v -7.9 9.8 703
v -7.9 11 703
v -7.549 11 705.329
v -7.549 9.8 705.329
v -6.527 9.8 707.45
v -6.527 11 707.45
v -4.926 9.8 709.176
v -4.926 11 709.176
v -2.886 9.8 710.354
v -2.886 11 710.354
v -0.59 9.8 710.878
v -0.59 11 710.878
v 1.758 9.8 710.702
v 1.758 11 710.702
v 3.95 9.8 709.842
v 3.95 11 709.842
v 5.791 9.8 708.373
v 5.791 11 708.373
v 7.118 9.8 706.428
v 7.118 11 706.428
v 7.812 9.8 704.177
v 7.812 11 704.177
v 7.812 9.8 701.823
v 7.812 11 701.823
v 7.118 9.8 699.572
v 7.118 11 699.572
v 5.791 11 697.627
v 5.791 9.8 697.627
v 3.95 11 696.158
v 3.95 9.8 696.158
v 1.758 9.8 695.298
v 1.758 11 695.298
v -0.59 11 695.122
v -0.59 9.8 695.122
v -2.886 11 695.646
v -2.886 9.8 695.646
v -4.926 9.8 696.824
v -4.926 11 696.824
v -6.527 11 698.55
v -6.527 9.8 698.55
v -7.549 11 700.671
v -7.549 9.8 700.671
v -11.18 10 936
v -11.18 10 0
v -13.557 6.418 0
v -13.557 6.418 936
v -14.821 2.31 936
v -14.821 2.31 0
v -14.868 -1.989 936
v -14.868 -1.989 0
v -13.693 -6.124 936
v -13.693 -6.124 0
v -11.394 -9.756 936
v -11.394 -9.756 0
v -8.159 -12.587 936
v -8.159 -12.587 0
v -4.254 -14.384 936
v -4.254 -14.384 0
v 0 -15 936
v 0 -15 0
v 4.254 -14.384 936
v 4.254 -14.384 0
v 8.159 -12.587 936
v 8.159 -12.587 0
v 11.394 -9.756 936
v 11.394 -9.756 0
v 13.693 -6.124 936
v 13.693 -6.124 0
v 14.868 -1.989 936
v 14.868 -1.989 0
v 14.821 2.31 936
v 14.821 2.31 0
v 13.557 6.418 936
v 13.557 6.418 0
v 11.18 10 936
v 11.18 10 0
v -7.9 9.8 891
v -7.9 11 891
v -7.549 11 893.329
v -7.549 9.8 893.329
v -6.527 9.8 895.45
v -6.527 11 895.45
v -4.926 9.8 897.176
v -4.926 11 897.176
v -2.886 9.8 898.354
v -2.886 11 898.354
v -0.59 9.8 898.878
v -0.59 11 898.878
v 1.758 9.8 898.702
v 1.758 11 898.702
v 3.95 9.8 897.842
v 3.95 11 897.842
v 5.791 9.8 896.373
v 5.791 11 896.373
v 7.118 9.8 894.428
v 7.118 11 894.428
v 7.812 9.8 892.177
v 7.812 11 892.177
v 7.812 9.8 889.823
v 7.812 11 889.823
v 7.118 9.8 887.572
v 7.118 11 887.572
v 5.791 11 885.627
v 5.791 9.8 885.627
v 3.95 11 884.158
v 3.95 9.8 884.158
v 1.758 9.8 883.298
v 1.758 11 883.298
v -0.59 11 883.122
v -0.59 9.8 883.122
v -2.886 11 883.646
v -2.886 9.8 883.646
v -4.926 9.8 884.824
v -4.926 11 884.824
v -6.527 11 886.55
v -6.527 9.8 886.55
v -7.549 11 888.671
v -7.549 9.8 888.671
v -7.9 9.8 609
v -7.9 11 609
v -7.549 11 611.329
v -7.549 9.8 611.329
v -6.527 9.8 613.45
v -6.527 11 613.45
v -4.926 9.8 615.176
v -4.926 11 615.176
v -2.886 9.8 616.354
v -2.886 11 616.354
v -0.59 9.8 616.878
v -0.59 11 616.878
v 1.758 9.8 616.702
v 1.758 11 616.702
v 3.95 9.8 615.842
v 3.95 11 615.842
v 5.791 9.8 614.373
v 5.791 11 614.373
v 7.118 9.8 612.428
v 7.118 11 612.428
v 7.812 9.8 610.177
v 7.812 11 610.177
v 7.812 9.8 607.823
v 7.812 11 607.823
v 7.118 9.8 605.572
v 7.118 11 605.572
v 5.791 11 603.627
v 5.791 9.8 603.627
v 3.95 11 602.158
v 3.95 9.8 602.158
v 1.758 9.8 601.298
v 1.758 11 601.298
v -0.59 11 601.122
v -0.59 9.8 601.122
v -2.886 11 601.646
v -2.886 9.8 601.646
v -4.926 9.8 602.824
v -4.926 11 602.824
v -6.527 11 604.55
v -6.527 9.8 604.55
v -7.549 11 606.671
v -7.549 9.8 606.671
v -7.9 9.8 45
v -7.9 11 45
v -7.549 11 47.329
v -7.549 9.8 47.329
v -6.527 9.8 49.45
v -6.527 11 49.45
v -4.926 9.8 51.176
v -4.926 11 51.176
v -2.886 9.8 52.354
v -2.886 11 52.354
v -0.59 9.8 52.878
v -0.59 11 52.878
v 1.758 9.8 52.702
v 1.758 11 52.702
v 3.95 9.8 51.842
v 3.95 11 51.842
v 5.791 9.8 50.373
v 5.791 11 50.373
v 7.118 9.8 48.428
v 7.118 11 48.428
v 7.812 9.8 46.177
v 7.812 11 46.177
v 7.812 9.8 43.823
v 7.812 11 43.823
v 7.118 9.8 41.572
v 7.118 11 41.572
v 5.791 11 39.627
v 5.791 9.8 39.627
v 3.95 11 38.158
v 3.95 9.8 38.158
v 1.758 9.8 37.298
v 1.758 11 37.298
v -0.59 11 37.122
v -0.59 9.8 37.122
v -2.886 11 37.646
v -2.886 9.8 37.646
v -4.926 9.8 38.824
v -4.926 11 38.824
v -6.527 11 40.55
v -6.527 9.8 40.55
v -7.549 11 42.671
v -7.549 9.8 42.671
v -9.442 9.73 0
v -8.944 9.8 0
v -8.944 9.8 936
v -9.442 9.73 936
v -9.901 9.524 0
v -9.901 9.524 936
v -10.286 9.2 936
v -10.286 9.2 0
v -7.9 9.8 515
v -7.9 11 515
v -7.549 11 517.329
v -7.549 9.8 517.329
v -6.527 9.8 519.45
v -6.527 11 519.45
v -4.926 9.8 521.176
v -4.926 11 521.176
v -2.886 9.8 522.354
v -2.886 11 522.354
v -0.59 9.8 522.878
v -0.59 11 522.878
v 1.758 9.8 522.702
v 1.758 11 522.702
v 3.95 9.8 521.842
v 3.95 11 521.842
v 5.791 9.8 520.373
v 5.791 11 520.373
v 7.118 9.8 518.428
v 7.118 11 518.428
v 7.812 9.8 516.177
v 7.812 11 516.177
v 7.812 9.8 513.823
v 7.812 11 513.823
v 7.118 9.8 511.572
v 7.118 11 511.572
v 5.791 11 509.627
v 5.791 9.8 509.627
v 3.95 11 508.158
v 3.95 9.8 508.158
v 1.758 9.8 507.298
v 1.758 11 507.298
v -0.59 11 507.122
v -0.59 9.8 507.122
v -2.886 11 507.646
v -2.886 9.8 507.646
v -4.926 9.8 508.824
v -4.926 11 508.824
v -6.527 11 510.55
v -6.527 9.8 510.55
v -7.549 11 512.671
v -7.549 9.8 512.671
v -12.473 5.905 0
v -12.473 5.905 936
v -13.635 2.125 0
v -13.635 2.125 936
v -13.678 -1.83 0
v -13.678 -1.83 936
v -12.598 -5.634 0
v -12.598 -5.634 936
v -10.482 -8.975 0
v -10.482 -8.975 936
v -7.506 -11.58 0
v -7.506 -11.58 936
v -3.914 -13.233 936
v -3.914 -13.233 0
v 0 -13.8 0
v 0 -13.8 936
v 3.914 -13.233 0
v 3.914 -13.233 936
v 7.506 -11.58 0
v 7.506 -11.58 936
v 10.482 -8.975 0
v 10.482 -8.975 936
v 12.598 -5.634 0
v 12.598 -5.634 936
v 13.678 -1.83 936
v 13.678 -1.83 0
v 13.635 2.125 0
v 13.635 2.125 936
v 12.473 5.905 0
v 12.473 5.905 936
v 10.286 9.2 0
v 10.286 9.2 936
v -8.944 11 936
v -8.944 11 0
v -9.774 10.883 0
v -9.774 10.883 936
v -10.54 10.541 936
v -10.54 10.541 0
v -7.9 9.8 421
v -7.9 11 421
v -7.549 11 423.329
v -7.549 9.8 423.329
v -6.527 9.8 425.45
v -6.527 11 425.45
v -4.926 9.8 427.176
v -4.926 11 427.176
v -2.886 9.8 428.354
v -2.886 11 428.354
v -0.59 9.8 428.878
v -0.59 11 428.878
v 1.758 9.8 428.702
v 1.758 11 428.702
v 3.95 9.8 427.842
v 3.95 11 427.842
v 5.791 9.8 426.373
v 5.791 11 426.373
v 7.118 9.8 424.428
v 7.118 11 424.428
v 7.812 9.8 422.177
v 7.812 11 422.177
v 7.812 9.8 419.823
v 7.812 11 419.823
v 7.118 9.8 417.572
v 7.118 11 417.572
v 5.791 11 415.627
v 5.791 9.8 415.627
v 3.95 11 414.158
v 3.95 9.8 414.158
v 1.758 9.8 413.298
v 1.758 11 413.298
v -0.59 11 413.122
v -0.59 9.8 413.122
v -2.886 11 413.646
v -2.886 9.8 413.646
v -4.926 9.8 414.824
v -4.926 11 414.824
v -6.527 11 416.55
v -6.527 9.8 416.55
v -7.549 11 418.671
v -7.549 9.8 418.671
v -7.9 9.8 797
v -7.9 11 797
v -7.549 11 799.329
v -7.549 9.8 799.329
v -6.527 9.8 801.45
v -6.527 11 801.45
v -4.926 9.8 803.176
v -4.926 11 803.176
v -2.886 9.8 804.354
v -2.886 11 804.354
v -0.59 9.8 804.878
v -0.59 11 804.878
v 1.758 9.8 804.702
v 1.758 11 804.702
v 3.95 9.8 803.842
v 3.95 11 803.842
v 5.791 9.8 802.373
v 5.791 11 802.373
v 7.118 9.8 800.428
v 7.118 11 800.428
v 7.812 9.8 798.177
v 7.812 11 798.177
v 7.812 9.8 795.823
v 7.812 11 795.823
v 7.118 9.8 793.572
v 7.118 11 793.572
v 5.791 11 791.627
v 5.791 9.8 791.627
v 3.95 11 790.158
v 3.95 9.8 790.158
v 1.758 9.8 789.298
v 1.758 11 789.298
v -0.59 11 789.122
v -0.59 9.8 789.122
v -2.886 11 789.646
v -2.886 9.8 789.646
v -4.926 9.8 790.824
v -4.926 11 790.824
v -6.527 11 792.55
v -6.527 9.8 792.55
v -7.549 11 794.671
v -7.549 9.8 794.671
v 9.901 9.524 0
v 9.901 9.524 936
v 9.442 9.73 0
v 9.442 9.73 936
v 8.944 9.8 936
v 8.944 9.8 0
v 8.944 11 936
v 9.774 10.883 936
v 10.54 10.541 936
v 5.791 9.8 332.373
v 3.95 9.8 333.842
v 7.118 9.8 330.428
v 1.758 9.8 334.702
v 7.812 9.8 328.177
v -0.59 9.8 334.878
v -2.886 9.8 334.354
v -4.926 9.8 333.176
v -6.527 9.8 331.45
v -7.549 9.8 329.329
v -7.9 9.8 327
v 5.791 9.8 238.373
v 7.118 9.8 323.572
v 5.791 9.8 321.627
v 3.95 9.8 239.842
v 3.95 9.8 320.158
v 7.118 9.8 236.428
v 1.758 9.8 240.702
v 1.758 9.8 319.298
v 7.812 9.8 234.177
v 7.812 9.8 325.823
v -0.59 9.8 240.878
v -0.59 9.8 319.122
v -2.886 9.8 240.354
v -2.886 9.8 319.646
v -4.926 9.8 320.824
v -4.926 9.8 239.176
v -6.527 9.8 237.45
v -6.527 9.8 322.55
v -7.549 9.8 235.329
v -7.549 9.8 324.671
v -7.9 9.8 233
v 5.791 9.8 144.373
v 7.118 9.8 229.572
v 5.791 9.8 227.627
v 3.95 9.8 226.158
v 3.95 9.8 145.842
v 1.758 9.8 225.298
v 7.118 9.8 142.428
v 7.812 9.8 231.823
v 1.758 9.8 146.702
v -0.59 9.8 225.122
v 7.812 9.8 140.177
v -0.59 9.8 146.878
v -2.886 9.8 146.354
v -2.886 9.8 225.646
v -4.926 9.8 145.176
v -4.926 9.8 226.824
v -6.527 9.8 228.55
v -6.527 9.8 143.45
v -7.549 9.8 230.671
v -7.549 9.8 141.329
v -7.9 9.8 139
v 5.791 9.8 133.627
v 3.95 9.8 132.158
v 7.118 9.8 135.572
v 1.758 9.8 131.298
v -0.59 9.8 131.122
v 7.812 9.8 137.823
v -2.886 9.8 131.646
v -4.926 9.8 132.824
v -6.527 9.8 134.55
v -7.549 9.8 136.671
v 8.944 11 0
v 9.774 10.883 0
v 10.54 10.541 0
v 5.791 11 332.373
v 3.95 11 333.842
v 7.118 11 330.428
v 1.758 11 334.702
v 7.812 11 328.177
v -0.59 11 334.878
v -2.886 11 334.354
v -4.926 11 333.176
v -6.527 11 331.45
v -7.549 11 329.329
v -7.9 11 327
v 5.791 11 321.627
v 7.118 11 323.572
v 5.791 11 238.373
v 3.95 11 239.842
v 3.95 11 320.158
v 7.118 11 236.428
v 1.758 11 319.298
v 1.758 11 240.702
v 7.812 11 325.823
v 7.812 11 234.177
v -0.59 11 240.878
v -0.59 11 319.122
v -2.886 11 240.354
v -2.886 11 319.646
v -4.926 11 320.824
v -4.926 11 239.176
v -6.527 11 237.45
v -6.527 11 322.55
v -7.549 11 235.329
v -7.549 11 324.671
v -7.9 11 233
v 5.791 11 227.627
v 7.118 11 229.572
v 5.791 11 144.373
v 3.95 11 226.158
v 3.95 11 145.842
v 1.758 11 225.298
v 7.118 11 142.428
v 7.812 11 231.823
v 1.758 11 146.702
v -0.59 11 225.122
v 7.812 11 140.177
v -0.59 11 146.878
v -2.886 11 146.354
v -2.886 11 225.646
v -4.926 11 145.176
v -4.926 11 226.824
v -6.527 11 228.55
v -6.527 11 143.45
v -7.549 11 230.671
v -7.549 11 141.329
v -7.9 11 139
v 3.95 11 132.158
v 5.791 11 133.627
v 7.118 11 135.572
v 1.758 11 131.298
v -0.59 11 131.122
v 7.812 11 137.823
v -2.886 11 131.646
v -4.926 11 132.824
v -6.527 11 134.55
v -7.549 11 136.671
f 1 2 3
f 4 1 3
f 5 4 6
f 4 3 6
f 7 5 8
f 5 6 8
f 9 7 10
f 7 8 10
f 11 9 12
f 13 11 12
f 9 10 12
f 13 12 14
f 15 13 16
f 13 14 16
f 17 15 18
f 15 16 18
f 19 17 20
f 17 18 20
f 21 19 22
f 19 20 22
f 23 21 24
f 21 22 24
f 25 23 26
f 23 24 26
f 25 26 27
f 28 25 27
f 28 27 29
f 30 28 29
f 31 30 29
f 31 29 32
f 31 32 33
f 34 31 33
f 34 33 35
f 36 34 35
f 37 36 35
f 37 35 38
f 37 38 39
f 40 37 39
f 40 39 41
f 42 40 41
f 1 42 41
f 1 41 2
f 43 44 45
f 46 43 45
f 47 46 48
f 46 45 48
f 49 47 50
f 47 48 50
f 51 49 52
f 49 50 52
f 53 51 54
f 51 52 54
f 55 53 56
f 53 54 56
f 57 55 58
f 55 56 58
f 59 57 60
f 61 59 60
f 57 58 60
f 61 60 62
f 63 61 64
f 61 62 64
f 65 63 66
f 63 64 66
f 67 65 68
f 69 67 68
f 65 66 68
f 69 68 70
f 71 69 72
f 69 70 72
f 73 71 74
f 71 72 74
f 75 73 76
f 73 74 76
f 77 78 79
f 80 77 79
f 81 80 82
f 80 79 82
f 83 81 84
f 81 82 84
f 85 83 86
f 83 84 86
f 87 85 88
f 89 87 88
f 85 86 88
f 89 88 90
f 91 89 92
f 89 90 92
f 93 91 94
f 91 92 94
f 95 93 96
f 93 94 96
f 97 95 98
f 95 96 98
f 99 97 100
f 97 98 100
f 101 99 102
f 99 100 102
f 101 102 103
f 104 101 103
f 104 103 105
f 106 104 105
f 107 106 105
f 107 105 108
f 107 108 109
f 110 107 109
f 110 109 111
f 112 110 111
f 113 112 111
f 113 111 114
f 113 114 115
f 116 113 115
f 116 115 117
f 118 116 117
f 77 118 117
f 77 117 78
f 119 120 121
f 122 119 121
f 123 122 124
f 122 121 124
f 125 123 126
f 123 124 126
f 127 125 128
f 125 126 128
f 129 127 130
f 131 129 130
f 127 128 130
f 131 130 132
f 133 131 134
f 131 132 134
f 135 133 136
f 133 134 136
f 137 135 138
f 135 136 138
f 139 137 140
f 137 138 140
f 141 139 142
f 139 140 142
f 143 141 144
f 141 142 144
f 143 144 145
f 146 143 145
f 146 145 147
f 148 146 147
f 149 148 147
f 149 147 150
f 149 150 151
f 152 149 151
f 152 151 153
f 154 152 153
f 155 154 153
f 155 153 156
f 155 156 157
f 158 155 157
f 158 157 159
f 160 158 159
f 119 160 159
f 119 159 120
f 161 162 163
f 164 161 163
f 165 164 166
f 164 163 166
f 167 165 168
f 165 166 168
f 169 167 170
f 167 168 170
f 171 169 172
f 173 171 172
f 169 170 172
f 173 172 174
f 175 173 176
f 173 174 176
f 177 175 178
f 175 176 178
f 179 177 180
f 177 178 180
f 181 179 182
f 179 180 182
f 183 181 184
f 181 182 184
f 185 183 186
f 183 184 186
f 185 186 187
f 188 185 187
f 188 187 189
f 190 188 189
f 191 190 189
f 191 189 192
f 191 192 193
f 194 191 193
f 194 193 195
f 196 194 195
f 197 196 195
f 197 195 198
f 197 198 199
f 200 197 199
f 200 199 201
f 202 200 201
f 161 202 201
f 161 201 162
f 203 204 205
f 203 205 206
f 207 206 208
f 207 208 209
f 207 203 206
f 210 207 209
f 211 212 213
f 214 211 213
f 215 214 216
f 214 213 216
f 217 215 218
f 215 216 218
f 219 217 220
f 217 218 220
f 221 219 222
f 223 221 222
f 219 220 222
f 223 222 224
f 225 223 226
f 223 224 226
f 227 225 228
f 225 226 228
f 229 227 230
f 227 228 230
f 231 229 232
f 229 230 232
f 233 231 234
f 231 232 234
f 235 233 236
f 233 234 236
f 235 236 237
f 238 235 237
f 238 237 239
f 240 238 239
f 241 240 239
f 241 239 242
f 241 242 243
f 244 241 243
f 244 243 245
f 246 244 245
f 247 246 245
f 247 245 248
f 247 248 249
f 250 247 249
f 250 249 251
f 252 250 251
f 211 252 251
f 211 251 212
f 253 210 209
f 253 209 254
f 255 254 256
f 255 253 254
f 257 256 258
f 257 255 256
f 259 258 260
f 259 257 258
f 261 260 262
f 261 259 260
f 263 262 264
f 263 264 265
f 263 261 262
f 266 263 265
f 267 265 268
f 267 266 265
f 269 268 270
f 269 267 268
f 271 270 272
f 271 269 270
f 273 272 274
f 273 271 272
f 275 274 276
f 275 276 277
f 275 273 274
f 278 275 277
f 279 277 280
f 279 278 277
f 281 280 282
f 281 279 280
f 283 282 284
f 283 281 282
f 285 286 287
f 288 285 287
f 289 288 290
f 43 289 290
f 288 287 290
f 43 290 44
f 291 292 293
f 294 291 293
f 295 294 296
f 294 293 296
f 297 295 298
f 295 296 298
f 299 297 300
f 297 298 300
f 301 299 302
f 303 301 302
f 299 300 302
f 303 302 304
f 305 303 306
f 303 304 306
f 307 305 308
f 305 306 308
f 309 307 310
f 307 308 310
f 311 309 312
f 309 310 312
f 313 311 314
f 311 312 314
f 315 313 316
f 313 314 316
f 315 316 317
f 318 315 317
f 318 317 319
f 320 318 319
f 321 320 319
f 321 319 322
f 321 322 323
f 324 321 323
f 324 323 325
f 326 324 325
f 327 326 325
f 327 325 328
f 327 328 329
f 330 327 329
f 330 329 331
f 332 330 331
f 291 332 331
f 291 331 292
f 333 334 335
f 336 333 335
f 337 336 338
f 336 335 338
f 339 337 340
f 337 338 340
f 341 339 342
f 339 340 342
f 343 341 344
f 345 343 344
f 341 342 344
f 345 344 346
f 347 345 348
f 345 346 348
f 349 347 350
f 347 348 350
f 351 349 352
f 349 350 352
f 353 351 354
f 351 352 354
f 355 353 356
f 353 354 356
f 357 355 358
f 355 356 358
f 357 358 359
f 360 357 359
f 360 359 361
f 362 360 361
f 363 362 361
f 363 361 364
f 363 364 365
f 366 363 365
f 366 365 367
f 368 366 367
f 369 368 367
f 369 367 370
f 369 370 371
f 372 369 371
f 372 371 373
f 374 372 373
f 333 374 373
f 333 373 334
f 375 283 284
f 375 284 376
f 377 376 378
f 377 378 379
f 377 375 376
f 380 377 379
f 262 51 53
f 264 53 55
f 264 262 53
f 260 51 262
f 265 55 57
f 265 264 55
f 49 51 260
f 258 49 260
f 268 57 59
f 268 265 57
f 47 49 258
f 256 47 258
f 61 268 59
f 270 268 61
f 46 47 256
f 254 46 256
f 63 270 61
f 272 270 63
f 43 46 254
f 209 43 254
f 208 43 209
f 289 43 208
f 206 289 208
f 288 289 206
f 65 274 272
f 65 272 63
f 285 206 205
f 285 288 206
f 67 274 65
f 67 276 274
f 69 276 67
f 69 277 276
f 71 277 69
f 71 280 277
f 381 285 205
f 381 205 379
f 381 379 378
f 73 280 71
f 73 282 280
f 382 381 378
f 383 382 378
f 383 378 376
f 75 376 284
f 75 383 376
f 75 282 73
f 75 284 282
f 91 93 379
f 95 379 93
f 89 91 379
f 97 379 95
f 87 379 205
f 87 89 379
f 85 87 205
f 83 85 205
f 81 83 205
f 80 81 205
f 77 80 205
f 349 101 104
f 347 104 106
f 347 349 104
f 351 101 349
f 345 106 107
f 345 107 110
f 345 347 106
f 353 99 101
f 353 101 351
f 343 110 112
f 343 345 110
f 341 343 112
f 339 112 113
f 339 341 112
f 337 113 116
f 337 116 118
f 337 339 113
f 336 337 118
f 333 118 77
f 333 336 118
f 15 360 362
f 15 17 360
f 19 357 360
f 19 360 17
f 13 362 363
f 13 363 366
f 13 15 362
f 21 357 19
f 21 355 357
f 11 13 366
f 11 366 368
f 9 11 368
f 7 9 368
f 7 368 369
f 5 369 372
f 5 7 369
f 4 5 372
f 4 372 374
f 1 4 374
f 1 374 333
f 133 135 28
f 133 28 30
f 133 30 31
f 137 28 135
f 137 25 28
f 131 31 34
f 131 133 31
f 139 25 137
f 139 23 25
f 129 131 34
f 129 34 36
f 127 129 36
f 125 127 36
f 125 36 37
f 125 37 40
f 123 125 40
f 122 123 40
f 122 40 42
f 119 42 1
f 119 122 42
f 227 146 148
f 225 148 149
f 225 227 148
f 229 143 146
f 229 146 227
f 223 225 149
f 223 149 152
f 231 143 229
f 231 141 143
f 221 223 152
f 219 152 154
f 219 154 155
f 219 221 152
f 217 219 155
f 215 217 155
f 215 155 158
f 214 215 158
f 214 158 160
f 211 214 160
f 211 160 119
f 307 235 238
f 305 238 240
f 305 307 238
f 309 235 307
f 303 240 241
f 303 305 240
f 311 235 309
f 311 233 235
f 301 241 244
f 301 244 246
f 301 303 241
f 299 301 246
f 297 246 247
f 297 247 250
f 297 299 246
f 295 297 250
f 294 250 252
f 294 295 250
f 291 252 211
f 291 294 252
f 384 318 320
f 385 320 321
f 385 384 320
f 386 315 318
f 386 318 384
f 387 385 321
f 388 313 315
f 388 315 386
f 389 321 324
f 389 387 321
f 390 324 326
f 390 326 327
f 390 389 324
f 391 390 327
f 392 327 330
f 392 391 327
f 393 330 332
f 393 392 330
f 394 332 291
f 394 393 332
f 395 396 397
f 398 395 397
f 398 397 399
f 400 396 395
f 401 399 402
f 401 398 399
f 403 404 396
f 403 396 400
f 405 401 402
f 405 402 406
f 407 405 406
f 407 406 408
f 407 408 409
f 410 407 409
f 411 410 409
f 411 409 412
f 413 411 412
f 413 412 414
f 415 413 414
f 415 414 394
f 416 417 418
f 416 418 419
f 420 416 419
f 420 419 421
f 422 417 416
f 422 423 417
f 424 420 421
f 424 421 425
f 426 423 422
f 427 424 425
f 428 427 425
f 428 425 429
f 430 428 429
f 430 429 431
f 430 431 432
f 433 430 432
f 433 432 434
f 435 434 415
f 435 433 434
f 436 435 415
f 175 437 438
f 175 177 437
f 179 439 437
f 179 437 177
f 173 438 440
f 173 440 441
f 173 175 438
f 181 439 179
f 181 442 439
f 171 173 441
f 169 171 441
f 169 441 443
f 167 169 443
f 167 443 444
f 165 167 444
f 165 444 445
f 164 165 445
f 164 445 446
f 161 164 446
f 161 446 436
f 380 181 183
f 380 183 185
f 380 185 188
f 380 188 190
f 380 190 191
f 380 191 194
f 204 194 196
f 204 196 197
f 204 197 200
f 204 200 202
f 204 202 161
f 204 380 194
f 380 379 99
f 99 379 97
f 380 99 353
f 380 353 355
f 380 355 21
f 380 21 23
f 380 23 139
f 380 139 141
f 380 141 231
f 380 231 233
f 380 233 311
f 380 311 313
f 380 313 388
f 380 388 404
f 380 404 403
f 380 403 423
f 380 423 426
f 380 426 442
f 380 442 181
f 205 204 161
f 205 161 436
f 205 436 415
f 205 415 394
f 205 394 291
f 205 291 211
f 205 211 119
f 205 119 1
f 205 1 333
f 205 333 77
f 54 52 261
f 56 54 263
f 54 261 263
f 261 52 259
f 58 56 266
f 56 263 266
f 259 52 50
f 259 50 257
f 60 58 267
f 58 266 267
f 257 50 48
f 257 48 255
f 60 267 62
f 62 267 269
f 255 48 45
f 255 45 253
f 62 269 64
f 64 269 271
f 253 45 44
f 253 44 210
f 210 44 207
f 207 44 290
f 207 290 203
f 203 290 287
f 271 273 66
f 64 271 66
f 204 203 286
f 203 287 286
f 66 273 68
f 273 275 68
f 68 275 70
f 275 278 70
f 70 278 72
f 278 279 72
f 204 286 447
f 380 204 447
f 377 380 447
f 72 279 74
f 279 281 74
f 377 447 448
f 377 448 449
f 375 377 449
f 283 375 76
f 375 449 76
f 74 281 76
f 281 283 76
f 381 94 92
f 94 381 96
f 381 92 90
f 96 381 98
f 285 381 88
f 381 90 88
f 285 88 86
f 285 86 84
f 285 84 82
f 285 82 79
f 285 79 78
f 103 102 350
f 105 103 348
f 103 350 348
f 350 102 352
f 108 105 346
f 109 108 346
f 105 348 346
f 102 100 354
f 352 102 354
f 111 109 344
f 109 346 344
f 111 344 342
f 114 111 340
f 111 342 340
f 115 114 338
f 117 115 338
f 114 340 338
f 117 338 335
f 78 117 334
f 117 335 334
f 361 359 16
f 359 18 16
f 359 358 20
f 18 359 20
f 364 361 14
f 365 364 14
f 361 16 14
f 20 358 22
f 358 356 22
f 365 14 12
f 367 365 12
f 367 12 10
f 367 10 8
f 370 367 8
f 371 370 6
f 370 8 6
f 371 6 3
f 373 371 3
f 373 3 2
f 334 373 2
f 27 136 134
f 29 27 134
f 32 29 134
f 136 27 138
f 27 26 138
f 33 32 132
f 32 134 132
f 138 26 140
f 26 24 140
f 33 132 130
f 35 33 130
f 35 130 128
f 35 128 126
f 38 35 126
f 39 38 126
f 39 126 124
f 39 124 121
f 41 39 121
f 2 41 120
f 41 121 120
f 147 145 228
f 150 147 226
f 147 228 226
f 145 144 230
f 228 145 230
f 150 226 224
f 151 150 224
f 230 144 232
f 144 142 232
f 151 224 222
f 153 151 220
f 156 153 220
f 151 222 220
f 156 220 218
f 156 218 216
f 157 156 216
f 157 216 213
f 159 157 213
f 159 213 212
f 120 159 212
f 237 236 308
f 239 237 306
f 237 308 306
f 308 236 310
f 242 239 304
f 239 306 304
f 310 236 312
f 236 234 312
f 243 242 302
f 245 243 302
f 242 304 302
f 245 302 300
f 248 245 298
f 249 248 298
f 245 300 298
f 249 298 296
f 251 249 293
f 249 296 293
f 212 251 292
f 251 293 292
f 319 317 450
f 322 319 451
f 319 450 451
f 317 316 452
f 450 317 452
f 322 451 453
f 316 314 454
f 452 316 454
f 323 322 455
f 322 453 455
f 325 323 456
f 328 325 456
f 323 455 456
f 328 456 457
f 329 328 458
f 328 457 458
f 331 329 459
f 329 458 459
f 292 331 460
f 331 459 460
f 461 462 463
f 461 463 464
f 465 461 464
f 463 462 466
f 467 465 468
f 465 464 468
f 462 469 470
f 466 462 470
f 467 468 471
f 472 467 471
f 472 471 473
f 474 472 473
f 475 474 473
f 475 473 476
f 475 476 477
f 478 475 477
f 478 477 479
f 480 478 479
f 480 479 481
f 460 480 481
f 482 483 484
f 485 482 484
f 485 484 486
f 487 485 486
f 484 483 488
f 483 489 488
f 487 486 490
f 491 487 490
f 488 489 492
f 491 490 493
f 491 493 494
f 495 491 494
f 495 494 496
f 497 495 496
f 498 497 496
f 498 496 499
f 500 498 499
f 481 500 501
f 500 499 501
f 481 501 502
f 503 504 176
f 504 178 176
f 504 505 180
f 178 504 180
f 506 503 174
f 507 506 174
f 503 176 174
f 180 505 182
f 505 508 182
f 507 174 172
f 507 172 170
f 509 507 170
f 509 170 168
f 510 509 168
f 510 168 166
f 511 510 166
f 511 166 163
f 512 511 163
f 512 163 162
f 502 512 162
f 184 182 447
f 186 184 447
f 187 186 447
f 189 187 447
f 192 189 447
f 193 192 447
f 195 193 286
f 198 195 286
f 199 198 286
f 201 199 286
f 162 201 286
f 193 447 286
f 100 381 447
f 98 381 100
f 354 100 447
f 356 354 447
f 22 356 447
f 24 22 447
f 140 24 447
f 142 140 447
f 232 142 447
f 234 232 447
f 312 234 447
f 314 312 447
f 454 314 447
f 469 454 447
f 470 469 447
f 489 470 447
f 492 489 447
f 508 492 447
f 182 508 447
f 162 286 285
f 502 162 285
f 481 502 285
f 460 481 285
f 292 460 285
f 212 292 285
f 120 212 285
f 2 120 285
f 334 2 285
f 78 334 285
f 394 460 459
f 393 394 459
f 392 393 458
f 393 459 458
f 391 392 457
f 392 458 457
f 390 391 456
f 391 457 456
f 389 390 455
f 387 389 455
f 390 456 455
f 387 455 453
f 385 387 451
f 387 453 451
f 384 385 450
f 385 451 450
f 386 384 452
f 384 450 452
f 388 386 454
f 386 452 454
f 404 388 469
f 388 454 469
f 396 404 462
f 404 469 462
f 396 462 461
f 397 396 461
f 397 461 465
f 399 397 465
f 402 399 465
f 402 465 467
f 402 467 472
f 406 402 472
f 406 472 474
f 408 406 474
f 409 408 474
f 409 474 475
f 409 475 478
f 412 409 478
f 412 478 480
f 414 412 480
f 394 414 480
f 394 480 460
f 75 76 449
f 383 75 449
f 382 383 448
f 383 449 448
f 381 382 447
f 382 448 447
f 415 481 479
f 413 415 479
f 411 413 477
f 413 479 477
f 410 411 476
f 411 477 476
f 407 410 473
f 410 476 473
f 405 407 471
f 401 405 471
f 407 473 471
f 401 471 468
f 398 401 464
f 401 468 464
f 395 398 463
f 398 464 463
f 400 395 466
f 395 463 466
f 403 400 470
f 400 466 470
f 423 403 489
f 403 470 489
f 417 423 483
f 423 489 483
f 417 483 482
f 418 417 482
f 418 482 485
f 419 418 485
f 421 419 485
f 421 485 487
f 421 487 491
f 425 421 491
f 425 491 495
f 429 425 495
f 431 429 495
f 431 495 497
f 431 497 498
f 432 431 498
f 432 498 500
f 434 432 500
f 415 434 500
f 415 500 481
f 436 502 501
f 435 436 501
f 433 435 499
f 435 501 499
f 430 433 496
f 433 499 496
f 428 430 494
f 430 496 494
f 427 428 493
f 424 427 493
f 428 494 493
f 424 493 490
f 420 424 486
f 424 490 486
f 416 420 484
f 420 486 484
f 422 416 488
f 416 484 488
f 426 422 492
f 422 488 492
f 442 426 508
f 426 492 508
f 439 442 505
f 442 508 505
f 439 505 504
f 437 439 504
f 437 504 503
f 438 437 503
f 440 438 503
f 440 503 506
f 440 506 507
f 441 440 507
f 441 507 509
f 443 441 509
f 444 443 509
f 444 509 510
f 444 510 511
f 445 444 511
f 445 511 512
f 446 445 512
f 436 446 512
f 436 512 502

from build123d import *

# Parameters (mm, degrees)
BOSS_EXTRUDE1_DEPTH = 936
CUT_EXTRUDE1_REACH  = 938.481
SKETCH2_R           = 7.9


with BuildPart() as part:
    # Sketch1 → Boss-Extrude1 (new body)
    with BuildSketch(Plane.XY):
        with BuildLine():
            Line((8.94427191, 11), (-8.94427191, 11))
            ThreePointArc((-8.94427191, 11), (-10.169016781, 10.738612788), (-11.180339887, 10))
            ThreePointArc((-11.180339887, 10), (0, -15), (11.180339887, 10))
            ThreePointArc((11.180339887, 10), (10.169016781, 10.738612788), (8.94427191, 11))
        make_face()
        with BuildLine():
            Line((8.94427191, 9.8), (-8.94427191, 9.8))
            ThreePointArc((-8.94427191, 9.8), (-9.679118833, 9.643167673), (-10.285912696, 9.2))
            ThreePointArc((-10.285912696, 9.2), (0, -13.8), (10.285912696, 9.2))
            ThreePointArc((10.285912696, 9.2), (9.679118833, 9.643167673), (8.94427191, 9.8))
        make_face(mode=Mode.SUBTRACT)
    extrude(amount=BOSS_EXTRUDE1_DEPTH)

    # Sketch2 → Cut-Extrude1 (cut, up to next)
    with BuildSketch(Plane(origin=(0, 11, 0), x_dir=(1, 0, 0), z_dir=(0, 1, 0)), mode=Mode.PRIVATE) as cut_extrude1_sk1:
        with Locations(Location((0, -891, 0), (0, 0, 180))):
            Circle(SKETCH2_R)
    cut_extrude1_tool1 = extrude(cut_extrude1_sk1.sketch, amount=-CUT_EXTRUDE1_REACH, mode=Mode.PRIVATE) & part.part
    # Sketch2 → Cut-Extrude1 (cut, up to next)
    with BuildSketch(Plane(origin=(0, 11, 0), x_dir=(1, 0, 0), z_dir=(0, 1, 0)), mode=Mode.PRIVATE) as cut_extrude1_sk2:
        with Locations(Location((0, -797, 0), (0, 0, 180))):
            Circle(SKETCH2_R)
    cut_extrude1_tool2 = extrude(cut_extrude1_sk2.sketch, amount=-CUT_EXTRUDE1_REACH, mode=Mode.PRIVATE) & part.part
    # Sketch2 → Cut-Extrude1 (cut, up to next)
    with BuildSketch(Plane(origin=(0, 11, 0), x_dir=(1, 0, 0), z_dir=(0, 1, 0)), mode=Mode.PRIVATE) as cut_extrude1_sk3:
        with Locations(Location((0, -703, 0), (0, 0, 180))):
            Circle(SKETCH2_R)
    cut_extrude1_tool3 = extrude(cut_extrude1_sk3.sketch, amount=-CUT_EXTRUDE1_REACH, mode=Mode.PRIVATE) & part.part
    # Sketch2 → Cut-Extrude1 (cut, up to next)
    with BuildSketch(Plane(origin=(0, 11, 0), x_dir=(1, 0, 0), z_dir=(0, 1, 0)), mode=Mode.PRIVATE) as cut_extrude1_sk4:
        with Locations(Location((0, -609, 0), (0, 0, 180))):
            Circle(SKETCH2_R)
    cut_extrude1_tool4 = extrude(cut_extrude1_sk4.sketch, amount=-CUT_EXTRUDE1_REACH, mode=Mode.PRIVATE) & part.part
    # Sketch2 → Cut-Extrude1 (cut, up to next)
    with BuildSketch(Plane(origin=(0, 11, 0), x_dir=(1, 0, 0), z_dir=(0, 1, 0)), mode=Mode.PRIVATE) as cut_extrude1_sk5:
        with Locations(Location((0, -515, 0), (0, 0, 180))):
            Circle(SKETCH2_R)
    cut_extrude1_tool5 = extrude(cut_extrude1_sk5.sketch, amount=-CUT_EXTRUDE1_REACH, mode=Mode.PRIVATE) & part.part
    # Sketch2 → Cut-Extrude1 (cut, up to next)
    with BuildSketch(Plane(origin=(0, 11, 0), x_dir=(1, 0, 0), z_dir=(0, 1, 0)), mode=Mode.PRIVATE) as cut_extrude1_sk6:
        with Locations(Location((0, -421, 0), (0, 0, 180))):
            Circle(SKETCH2_R)
    cut_extrude1_tool6 = extrude(cut_extrude1_sk6.sketch, amount=-CUT_EXTRUDE1_REACH, mode=Mode.PRIVATE) & part.part
    # Sketch2 → Cut-Extrude1 (cut, up to next)
    with BuildSketch(Plane(origin=(0, 11, 0), x_dir=(1, 0, 0), z_dir=(0, 1, 0)), mode=Mode.PRIVATE) as cut_extrude1_sk7:
        with Locations(Location((0, -327, 0), (0, 0, 180))):
            Circle(SKETCH2_R)
    cut_extrude1_tool7 = extrude(cut_extrude1_sk7.sketch, amount=-CUT_EXTRUDE1_REACH, mode=Mode.PRIVATE) & part.part
    # Sketch2 → Cut-Extrude1 (cut, up to next)
    with BuildSketch(Plane(origin=(0, 11, 0), x_dir=(1, 0, 0), z_dir=(0, 1, 0)), mode=Mode.PRIVATE) as cut_extrude1_sk8:
        with Locations(Location((0, -233, 0), (0, 0, 180))):
            Circle(SKETCH2_R)
    cut_extrude1_tool8 = extrude(cut_extrude1_sk8.sketch, amount=-CUT_EXTRUDE1_REACH, mode=Mode.PRIVATE) & part.part
    # Sketch2 → Cut-Extrude1 (cut, up to next)
    with BuildSketch(Plane(origin=(0, 11, 0), x_dir=(1, 0, 0), z_dir=(0, 1, 0)), mode=Mode.PRIVATE) as cut_extrude1_sk9:
        with Locations(Location((0, -139, 0), (0, 0, 180))):
            Circle(SKETCH2_R)
    cut_extrude1_tool9 = extrude(cut_extrude1_sk9.sketch, amount=-CUT_EXTRUDE1_REACH, mode=Mode.PRIVATE) & part.part
    # Sketch2 → Cut-Extrude1 (cut, up to next)
    with BuildSketch(Plane(origin=(0, 11, 0), x_dir=(1, 0, 0), z_dir=(0, 1, 0)), mode=Mode.PRIVATE) as cut_extrude1_sk10:
        with Locations(Location((0, -45, 0), (0, 0, 180))):
            Circle(SKETCH2_R)
    cut_extrude1_tool10 = extrude(cut_extrude1_sk10.sketch, amount=-CUT_EXTRUDE1_REACH, mode=Mode.PRIVATE) & part.part
    add(cut_extrude1_tool1.solids().sort_by_distance((0, 11, 891))[0], mode=Mode.SUBTRACT)
    add(cut_extrude1_tool2.solids().sort_by_distance((0, 11, 797))[0], mode=Mode.SUBTRACT)
    add(cut_extrude1_tool3.solids().sort_by_distance((0, 11, 703))[0], mode=Mode.SUBTRACT)
    add(cut_extrude1_tool4.solids().sort_by_distance((0, 11, 609))[0], mode=Mode.SUBTRACT)
    add(cut_extrude1_tool5.solids().sort_by_distance((0, 11, 515))[0], mode=Mode.SUBTRACT)
    add(cut_extrude1_tool6.solids().sort_by_distance((0, 11, 421))[0], mode=Mode.SUBTRACT)
    add(cut_extrude1_tool7.solids().sort_by_distance((0, 11, 327))[0], mode=Mode.SUBTRACT)
    add(cut_extrude1_tool8.solids().sort_by_distance((0, 11, 233))[0], mode=Mode.SUBTRACT)
    add(cut_extrude1_tool9.solids().sort_by_distance((0, 11, 139))[0], mode=Mode.SUBTRACT)
    add(cut_extrude1_tool10.solids().sort_by_distance((0, 11, 45))[0], mode=Mode.SUBTRACT)


solid = part.part
